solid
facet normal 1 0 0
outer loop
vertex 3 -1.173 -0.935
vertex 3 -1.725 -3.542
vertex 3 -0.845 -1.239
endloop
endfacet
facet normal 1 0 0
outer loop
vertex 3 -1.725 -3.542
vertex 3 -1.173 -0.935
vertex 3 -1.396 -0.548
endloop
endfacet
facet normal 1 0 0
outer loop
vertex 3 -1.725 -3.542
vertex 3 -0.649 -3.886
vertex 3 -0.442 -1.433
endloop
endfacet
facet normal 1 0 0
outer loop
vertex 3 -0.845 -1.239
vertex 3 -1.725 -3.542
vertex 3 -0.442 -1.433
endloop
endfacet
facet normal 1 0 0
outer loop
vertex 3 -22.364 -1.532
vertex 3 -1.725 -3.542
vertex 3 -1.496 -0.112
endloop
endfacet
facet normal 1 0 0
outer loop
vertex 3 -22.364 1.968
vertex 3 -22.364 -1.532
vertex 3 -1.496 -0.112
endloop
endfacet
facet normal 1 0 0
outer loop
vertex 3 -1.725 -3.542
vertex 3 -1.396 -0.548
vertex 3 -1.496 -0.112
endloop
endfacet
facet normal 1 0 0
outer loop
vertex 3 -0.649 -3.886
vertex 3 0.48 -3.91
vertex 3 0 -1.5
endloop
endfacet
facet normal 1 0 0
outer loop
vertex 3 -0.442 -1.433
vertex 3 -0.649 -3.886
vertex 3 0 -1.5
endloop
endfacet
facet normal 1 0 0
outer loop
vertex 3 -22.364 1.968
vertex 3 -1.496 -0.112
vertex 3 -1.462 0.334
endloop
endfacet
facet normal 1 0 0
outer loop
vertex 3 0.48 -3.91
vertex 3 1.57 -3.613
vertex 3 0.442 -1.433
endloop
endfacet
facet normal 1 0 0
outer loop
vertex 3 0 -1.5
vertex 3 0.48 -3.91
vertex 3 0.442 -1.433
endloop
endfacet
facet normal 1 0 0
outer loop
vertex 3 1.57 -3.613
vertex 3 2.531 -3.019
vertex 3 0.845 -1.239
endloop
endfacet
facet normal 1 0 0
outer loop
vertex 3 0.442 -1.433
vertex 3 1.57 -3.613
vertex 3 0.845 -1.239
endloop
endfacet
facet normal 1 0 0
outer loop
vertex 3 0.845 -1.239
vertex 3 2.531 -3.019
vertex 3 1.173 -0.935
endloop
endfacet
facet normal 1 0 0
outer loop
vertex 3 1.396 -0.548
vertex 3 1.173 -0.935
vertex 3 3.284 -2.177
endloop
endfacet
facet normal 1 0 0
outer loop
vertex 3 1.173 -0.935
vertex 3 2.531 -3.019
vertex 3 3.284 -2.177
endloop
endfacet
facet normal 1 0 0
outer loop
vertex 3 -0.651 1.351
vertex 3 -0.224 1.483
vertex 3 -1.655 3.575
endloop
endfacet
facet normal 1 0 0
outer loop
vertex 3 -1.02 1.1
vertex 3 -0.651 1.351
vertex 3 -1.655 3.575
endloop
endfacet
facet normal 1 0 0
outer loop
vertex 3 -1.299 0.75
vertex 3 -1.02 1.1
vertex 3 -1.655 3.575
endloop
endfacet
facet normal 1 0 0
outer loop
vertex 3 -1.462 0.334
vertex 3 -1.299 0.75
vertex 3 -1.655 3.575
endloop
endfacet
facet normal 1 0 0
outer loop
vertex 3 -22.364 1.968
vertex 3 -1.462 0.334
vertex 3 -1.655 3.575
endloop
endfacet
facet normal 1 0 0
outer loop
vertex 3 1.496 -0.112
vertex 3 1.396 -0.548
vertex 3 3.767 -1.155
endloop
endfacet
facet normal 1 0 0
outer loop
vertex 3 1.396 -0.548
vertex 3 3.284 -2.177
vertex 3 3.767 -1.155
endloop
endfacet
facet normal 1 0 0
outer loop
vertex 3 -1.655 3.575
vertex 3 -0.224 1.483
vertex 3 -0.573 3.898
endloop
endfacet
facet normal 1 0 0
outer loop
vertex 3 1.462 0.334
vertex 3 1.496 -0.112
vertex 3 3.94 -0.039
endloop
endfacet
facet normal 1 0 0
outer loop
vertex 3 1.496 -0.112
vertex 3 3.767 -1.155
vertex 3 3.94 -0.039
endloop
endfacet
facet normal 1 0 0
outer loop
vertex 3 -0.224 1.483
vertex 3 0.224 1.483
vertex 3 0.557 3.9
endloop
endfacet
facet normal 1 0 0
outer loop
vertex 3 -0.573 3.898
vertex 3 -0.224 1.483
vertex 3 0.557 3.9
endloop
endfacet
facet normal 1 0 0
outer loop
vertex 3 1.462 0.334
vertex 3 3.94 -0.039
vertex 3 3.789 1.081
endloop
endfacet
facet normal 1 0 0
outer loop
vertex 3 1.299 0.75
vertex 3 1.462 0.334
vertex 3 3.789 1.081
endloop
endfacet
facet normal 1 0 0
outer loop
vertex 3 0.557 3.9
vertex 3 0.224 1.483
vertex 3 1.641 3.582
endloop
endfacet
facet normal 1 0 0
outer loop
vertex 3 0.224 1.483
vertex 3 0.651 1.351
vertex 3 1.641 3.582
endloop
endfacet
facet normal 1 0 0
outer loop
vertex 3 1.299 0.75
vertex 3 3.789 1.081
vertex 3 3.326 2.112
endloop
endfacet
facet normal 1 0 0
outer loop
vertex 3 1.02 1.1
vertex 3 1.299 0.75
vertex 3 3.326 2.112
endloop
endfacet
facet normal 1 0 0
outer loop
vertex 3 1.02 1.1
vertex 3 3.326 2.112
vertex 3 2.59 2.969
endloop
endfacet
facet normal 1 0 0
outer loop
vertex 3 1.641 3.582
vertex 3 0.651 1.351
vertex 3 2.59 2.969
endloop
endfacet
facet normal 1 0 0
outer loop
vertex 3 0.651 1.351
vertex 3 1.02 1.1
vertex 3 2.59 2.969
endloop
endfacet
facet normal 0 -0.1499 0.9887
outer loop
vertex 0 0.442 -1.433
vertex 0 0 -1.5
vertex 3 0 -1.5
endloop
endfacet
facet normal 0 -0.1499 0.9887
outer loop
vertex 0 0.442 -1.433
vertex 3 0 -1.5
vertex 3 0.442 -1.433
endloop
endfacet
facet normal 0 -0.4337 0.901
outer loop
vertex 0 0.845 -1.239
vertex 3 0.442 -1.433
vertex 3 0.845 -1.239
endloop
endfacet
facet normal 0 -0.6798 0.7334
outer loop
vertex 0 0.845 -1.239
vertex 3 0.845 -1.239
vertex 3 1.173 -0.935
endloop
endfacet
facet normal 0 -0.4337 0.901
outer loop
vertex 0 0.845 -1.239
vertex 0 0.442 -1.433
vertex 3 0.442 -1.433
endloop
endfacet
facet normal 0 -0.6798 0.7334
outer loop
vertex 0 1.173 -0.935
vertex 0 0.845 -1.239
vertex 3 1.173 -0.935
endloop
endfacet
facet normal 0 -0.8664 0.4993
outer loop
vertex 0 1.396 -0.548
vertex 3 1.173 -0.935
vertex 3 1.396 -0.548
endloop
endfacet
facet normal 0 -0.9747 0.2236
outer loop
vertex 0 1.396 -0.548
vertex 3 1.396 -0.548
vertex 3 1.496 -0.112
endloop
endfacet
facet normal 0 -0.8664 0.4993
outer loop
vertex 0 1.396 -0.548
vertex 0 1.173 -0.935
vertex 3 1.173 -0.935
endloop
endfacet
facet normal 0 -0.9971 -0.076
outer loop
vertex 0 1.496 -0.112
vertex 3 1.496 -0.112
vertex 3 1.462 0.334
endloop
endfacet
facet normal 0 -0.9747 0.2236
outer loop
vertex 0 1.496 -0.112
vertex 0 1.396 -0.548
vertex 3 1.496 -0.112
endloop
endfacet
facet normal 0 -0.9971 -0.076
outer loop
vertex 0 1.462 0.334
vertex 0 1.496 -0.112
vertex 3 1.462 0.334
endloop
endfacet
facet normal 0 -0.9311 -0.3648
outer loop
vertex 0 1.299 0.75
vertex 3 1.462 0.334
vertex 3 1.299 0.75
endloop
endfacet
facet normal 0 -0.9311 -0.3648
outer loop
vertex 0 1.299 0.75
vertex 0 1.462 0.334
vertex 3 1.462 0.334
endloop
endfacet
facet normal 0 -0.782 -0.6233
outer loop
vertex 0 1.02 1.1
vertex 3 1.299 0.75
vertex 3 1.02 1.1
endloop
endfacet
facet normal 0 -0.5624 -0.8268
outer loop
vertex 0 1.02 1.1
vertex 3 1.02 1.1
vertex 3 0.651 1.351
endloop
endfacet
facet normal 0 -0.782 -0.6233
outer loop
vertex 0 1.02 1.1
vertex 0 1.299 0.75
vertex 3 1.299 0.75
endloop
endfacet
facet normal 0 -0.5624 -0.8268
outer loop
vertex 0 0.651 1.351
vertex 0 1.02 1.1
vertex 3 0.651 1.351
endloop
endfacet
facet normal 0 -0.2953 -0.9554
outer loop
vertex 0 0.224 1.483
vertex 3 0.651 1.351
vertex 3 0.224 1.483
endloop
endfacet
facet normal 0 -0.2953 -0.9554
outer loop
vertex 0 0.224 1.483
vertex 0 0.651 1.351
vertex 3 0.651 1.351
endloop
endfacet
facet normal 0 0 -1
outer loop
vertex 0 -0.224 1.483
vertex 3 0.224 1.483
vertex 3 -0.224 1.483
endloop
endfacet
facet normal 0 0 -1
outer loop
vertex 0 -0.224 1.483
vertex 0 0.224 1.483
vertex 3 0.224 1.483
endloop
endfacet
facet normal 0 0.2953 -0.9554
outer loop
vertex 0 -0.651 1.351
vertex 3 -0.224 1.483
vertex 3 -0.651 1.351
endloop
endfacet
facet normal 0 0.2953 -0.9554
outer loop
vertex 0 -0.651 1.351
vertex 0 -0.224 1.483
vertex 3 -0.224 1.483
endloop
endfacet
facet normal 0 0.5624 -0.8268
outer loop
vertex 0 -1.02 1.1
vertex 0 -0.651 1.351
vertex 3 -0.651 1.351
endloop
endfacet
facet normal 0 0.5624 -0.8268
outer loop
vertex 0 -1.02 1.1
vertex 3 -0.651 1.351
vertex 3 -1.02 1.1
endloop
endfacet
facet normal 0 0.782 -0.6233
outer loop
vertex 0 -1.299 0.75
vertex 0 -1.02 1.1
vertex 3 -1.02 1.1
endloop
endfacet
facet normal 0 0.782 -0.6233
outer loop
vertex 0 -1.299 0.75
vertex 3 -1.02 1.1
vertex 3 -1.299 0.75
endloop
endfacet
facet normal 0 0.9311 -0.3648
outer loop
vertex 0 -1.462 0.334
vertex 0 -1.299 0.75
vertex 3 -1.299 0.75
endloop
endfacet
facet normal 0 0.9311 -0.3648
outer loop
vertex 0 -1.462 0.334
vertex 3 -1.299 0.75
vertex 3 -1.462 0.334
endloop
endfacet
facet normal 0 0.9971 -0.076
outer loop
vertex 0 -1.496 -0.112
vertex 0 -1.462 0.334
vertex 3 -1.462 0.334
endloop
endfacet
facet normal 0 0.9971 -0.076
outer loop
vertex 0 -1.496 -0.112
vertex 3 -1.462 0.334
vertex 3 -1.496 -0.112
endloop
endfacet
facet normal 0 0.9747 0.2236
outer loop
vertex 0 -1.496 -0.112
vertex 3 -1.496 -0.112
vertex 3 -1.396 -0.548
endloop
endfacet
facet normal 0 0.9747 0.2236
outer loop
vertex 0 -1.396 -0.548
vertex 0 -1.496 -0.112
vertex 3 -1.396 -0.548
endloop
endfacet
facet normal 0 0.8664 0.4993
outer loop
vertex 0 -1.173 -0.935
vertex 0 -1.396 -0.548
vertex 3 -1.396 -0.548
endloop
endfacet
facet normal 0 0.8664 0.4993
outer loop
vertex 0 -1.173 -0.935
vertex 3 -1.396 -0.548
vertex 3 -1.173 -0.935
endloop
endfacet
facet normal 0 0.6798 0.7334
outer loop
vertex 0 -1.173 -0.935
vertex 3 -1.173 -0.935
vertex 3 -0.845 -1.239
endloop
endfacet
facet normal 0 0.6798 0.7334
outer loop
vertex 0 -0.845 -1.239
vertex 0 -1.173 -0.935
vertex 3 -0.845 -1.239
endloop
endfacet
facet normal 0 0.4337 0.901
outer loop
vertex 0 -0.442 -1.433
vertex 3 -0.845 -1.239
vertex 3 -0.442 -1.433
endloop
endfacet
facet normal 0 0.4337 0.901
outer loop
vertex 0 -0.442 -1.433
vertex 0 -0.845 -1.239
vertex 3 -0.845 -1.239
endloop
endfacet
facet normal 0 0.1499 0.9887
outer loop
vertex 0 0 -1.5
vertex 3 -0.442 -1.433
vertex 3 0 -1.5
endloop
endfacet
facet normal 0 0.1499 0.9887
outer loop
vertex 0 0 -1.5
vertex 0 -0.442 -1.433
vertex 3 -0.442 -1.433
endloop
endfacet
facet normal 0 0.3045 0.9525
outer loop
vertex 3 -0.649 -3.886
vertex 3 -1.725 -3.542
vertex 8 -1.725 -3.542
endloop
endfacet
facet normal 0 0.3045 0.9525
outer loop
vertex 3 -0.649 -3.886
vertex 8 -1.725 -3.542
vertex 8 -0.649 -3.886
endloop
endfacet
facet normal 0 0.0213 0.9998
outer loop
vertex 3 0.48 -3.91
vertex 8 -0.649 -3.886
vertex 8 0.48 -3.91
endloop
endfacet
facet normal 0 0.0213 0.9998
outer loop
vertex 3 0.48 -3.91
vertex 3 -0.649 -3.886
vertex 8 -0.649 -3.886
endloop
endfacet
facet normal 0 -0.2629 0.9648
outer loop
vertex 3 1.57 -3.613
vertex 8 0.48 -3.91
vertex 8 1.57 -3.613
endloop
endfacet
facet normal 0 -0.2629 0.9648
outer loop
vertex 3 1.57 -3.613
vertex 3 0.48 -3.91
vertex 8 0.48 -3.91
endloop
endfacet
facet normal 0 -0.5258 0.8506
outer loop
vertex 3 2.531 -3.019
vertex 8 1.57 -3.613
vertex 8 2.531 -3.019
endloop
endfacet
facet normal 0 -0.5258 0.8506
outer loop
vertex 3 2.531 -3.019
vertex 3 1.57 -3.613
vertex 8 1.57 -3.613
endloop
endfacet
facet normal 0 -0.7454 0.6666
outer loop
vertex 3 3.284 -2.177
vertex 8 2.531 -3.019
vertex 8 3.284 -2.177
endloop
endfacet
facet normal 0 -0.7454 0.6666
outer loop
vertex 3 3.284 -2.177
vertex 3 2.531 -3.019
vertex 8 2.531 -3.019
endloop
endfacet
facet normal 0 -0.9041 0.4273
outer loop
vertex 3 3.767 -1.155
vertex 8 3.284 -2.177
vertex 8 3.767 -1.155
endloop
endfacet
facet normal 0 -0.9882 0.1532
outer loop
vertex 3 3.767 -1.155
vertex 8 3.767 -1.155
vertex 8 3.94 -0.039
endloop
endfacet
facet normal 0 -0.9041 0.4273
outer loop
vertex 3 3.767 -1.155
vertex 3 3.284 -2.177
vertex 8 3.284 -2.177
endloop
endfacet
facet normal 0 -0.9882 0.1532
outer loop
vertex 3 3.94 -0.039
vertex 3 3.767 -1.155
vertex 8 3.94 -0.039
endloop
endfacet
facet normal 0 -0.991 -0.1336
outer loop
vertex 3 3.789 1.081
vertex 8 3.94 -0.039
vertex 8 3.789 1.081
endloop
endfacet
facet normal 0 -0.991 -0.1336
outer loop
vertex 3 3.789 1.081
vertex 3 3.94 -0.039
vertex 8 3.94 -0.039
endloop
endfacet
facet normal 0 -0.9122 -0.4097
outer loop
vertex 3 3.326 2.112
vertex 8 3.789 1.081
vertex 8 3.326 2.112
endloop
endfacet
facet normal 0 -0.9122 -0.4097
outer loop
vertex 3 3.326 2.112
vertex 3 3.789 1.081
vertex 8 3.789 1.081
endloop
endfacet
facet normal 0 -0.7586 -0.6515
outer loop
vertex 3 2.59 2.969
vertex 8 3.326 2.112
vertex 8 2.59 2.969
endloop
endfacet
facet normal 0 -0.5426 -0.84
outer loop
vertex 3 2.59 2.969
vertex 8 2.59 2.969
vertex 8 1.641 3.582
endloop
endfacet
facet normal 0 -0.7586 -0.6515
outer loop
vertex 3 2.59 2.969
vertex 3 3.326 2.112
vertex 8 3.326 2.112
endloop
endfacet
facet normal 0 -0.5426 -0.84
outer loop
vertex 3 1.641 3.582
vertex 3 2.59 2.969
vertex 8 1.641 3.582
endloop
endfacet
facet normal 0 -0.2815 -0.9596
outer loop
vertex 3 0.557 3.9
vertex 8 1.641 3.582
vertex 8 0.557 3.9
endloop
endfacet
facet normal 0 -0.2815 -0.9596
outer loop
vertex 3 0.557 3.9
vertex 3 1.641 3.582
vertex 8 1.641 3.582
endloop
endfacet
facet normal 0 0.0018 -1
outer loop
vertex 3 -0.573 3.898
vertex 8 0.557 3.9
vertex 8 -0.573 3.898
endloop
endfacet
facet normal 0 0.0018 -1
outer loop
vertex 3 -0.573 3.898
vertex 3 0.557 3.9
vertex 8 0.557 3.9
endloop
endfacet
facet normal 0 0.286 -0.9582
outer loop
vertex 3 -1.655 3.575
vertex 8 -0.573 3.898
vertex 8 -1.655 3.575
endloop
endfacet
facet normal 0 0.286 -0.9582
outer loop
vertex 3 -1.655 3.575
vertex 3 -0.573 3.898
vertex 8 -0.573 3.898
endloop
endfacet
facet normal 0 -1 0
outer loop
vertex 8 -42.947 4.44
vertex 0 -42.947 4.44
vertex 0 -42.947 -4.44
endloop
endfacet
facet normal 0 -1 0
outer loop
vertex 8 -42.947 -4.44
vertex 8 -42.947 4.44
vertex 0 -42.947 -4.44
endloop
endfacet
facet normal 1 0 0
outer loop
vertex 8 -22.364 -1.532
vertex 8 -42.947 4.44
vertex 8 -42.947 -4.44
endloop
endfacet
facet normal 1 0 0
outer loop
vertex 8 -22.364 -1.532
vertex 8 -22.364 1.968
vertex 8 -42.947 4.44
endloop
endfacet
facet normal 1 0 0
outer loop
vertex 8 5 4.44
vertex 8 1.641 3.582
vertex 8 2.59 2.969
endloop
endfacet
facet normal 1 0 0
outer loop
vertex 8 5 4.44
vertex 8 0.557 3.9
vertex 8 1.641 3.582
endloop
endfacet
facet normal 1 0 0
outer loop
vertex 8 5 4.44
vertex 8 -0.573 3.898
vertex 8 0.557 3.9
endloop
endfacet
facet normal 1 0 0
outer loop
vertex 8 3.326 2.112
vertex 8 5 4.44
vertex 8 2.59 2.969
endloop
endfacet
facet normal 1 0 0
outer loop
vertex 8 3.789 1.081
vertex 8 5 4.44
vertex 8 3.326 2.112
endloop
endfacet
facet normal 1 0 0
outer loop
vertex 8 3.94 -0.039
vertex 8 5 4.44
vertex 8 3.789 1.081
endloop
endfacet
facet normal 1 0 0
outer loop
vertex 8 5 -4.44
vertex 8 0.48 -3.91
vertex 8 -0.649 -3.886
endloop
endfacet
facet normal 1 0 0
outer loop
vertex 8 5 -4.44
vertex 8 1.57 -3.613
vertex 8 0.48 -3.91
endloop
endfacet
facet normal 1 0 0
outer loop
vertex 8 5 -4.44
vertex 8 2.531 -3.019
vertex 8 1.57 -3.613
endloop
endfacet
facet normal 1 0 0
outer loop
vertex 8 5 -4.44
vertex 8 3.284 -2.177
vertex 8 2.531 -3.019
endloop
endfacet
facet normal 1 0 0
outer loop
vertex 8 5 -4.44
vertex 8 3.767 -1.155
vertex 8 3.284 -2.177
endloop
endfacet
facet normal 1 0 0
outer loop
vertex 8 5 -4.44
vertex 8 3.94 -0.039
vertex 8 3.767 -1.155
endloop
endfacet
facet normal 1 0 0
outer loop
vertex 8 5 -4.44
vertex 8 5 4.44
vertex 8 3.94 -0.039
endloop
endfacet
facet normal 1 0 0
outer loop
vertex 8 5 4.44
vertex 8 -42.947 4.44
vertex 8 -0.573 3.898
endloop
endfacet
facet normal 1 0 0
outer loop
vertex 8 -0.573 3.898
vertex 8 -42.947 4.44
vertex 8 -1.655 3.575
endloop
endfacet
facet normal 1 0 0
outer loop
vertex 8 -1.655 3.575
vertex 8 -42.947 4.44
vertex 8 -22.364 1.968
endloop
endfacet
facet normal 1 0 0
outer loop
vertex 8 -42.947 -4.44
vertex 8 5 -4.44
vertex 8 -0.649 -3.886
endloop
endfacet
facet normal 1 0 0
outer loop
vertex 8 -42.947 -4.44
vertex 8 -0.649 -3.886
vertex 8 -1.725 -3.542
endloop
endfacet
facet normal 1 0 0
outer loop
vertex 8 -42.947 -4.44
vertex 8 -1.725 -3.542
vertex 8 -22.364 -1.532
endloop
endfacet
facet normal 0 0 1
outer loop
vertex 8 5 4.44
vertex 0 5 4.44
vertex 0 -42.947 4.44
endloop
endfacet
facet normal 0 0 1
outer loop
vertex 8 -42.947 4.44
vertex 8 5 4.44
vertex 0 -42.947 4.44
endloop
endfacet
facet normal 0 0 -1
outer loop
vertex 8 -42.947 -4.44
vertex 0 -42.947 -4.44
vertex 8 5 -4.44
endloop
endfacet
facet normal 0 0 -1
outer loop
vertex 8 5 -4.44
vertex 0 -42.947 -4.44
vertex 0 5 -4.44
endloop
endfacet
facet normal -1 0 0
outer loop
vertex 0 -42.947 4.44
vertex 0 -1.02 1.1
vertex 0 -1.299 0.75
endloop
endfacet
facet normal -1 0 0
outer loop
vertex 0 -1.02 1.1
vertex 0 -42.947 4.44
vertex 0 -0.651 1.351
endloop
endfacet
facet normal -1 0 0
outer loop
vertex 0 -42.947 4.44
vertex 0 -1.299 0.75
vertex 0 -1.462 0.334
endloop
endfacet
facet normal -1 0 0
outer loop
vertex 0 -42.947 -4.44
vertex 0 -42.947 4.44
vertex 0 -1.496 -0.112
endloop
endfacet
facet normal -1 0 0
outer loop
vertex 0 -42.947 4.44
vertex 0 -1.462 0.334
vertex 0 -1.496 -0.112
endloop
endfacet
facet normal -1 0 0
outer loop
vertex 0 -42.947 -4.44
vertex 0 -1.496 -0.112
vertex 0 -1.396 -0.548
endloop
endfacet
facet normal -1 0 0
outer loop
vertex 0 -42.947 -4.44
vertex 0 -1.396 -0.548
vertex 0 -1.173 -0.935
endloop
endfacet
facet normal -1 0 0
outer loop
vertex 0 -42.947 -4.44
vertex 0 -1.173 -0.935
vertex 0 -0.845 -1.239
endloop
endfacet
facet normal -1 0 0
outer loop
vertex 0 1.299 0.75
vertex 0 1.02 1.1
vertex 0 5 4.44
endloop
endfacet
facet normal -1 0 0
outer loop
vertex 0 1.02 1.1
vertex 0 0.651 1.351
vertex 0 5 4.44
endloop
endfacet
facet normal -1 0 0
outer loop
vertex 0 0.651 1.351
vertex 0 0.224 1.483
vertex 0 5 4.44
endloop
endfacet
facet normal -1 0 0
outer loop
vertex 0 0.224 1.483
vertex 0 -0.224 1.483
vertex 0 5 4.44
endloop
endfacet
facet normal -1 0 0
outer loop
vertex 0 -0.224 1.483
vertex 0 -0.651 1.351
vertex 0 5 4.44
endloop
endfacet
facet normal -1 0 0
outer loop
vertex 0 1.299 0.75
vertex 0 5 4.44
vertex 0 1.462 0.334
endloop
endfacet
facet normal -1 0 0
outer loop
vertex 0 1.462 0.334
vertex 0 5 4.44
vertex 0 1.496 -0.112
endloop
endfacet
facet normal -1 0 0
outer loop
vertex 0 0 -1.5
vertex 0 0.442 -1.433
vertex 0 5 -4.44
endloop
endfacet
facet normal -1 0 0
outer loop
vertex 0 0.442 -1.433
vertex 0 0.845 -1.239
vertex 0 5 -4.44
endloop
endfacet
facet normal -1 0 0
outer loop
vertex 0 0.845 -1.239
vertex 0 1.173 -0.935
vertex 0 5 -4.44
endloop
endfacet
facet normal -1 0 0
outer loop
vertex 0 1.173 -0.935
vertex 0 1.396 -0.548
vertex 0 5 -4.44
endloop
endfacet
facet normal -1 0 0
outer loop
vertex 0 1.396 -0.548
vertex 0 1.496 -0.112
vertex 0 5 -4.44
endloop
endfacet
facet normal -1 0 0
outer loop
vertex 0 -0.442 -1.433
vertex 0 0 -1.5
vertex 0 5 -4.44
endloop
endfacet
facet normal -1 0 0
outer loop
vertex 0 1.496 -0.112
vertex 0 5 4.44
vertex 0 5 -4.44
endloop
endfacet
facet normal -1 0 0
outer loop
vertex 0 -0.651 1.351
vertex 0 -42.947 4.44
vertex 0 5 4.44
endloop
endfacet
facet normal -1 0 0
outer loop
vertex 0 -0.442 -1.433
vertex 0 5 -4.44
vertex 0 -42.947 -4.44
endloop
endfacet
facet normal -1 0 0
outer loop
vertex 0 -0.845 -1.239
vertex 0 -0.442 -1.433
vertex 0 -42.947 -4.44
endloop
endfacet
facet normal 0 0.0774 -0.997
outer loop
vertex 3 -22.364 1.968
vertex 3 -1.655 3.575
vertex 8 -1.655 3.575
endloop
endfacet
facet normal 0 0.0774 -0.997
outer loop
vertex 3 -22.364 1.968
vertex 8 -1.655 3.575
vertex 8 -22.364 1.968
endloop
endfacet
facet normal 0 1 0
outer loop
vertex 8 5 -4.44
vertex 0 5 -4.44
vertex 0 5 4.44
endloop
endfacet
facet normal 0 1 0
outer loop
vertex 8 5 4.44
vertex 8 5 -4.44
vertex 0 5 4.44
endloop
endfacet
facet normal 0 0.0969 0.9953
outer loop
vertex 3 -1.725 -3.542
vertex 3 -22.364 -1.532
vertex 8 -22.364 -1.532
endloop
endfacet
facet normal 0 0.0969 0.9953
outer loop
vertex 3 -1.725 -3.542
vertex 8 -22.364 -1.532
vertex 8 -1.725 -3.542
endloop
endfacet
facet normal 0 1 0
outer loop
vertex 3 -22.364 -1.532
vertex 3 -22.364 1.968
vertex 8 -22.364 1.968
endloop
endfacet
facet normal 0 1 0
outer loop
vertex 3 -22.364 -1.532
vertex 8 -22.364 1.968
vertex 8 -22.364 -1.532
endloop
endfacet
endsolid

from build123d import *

# Parameters (mm, degrees)
BOSS_EXTRUDE1_DEPTH = 8
SKETCH1_3_R         = 1.5
BOSS_EXTRUDE2_DEPTH = 3
BOSS_EXTRUDE5_START = -8
BOSS_EXTRUDE5_DEPTH = 8


with BuildPart() as part:
    # Sketch1 → Boss-Extrude1 (new body)
    with BuildSketch(Plane(origin=(0, 0, 0), x_dir=(0, 0, -1), z_dir=(1, 0, 0))):
        with BuildLine():
            ThreePointArc((-4.119669775, -1.65532903), (0.037822774, 4.439635423), (4.090869231, -1.725277422))
            Line((4.090869231, -1.725277422), (1.82908276, -24.946763134))
            Line((1.82908276, -24.946763134), (-2.312399702, -24.946763134))
            Line((-2.312399702, -24.946763134), (-4.119669775, -1.65532903))
        make_face()
        with BuildLine():
            Line((-3.575175872, -1.65532903), (-1.968294835, -22.364222709))
            Line((-1.968294835, -22.364222709), (1.531705165, -22.364222709))
            Line((1.531705165, -22.364222709), (3.541950668, -1.725277422))
            ThreePointArc((3.541950668, -1.725277422), (0.038719155, 3.939606268), (-3.575175872, -1.65532903))
        make_face(mode=Mode.SUBTRACT)
    extrude(amount=BOSS_EXTRUDE1_DEPTH)

    # Sketch1<3> → Boss-Extrude2 (add)
    with BuildSketch(Plane(origin=(0, 0, 0), x_dir=(0, 0, -1), z_dir=(1, 0, 0))):
        with BuildLine():
            ThreePointArc((-3.575175872, -1.65532903), (0.038719155, 3.939606268), (3.541950668, -1.725277422))
            Line((3.541950668, -1.725277422), (1.531705165, -22.364222709))
            Line((1.531705165, -22.364222709), (-1.968294835, -22.364222709))
            Line((-1.968294835, -22.364222709), (-3.575175872, -1.65532903))
        make_face()
        Circle(SKETCH1_3_R, mode=Mode.SUBTRACT)
    extrude(amount=BOSS_EXTRUDE2_DEPTH)

    # Sketch4 → Boss-Extrude5 (add)
    with BuildSketch(Plane(origin=(8, 0, 0), x_dir=(0, 0, -1), z_dir=(1, 0, 0)).offset(BOSS_EXTRUDE5_START)):
        with BuildLine():
            Line((4.439796532, 5.000361233), (-4.439796532, 5.000361233))
            Line((-4.439796532, 5.000361233), (-4.439796532, -2e-08))
            ThreePointArc((-4.439796532, -2e-08), (1e-08, 4.439796532), (4.439796532, -4e-08))
            Line((4.439796532, -4e-08), (4.439796532, 5.000361233))
        make_face()
        with BuildLine():
            ThreePointArc((-4.119669775, -1.65532903), (-4.359030213, -0.842999912), (-4.439796532, -2e-08))
            Line((-4.439796532, -2e-08), (-4.439796532, -42.946763134))
            Line((-4.439796532, -42.946763134), (4.439796532, -42.946763134))
            Line((4.439796532, -42.946763134), (4.439796532, -4e-08))
            ThreePointArc((4.439796532, -4e-08), (4.351690488, -0.880104054), (4.090869231, -1.725277422))
            Line((4.090869231, -1.725277422), (1.82908276, -24.946763134))
            Line((1.82908276, -24.946763134), (-2.312399702, -24.946763134))
            Line((-2.312399702, -24.946763134), (-4.119669775, -1.65532903))
        make_face()
    extrude(amount=BOSS_EXTRUDE5_DEPTH)


solid = part.part
